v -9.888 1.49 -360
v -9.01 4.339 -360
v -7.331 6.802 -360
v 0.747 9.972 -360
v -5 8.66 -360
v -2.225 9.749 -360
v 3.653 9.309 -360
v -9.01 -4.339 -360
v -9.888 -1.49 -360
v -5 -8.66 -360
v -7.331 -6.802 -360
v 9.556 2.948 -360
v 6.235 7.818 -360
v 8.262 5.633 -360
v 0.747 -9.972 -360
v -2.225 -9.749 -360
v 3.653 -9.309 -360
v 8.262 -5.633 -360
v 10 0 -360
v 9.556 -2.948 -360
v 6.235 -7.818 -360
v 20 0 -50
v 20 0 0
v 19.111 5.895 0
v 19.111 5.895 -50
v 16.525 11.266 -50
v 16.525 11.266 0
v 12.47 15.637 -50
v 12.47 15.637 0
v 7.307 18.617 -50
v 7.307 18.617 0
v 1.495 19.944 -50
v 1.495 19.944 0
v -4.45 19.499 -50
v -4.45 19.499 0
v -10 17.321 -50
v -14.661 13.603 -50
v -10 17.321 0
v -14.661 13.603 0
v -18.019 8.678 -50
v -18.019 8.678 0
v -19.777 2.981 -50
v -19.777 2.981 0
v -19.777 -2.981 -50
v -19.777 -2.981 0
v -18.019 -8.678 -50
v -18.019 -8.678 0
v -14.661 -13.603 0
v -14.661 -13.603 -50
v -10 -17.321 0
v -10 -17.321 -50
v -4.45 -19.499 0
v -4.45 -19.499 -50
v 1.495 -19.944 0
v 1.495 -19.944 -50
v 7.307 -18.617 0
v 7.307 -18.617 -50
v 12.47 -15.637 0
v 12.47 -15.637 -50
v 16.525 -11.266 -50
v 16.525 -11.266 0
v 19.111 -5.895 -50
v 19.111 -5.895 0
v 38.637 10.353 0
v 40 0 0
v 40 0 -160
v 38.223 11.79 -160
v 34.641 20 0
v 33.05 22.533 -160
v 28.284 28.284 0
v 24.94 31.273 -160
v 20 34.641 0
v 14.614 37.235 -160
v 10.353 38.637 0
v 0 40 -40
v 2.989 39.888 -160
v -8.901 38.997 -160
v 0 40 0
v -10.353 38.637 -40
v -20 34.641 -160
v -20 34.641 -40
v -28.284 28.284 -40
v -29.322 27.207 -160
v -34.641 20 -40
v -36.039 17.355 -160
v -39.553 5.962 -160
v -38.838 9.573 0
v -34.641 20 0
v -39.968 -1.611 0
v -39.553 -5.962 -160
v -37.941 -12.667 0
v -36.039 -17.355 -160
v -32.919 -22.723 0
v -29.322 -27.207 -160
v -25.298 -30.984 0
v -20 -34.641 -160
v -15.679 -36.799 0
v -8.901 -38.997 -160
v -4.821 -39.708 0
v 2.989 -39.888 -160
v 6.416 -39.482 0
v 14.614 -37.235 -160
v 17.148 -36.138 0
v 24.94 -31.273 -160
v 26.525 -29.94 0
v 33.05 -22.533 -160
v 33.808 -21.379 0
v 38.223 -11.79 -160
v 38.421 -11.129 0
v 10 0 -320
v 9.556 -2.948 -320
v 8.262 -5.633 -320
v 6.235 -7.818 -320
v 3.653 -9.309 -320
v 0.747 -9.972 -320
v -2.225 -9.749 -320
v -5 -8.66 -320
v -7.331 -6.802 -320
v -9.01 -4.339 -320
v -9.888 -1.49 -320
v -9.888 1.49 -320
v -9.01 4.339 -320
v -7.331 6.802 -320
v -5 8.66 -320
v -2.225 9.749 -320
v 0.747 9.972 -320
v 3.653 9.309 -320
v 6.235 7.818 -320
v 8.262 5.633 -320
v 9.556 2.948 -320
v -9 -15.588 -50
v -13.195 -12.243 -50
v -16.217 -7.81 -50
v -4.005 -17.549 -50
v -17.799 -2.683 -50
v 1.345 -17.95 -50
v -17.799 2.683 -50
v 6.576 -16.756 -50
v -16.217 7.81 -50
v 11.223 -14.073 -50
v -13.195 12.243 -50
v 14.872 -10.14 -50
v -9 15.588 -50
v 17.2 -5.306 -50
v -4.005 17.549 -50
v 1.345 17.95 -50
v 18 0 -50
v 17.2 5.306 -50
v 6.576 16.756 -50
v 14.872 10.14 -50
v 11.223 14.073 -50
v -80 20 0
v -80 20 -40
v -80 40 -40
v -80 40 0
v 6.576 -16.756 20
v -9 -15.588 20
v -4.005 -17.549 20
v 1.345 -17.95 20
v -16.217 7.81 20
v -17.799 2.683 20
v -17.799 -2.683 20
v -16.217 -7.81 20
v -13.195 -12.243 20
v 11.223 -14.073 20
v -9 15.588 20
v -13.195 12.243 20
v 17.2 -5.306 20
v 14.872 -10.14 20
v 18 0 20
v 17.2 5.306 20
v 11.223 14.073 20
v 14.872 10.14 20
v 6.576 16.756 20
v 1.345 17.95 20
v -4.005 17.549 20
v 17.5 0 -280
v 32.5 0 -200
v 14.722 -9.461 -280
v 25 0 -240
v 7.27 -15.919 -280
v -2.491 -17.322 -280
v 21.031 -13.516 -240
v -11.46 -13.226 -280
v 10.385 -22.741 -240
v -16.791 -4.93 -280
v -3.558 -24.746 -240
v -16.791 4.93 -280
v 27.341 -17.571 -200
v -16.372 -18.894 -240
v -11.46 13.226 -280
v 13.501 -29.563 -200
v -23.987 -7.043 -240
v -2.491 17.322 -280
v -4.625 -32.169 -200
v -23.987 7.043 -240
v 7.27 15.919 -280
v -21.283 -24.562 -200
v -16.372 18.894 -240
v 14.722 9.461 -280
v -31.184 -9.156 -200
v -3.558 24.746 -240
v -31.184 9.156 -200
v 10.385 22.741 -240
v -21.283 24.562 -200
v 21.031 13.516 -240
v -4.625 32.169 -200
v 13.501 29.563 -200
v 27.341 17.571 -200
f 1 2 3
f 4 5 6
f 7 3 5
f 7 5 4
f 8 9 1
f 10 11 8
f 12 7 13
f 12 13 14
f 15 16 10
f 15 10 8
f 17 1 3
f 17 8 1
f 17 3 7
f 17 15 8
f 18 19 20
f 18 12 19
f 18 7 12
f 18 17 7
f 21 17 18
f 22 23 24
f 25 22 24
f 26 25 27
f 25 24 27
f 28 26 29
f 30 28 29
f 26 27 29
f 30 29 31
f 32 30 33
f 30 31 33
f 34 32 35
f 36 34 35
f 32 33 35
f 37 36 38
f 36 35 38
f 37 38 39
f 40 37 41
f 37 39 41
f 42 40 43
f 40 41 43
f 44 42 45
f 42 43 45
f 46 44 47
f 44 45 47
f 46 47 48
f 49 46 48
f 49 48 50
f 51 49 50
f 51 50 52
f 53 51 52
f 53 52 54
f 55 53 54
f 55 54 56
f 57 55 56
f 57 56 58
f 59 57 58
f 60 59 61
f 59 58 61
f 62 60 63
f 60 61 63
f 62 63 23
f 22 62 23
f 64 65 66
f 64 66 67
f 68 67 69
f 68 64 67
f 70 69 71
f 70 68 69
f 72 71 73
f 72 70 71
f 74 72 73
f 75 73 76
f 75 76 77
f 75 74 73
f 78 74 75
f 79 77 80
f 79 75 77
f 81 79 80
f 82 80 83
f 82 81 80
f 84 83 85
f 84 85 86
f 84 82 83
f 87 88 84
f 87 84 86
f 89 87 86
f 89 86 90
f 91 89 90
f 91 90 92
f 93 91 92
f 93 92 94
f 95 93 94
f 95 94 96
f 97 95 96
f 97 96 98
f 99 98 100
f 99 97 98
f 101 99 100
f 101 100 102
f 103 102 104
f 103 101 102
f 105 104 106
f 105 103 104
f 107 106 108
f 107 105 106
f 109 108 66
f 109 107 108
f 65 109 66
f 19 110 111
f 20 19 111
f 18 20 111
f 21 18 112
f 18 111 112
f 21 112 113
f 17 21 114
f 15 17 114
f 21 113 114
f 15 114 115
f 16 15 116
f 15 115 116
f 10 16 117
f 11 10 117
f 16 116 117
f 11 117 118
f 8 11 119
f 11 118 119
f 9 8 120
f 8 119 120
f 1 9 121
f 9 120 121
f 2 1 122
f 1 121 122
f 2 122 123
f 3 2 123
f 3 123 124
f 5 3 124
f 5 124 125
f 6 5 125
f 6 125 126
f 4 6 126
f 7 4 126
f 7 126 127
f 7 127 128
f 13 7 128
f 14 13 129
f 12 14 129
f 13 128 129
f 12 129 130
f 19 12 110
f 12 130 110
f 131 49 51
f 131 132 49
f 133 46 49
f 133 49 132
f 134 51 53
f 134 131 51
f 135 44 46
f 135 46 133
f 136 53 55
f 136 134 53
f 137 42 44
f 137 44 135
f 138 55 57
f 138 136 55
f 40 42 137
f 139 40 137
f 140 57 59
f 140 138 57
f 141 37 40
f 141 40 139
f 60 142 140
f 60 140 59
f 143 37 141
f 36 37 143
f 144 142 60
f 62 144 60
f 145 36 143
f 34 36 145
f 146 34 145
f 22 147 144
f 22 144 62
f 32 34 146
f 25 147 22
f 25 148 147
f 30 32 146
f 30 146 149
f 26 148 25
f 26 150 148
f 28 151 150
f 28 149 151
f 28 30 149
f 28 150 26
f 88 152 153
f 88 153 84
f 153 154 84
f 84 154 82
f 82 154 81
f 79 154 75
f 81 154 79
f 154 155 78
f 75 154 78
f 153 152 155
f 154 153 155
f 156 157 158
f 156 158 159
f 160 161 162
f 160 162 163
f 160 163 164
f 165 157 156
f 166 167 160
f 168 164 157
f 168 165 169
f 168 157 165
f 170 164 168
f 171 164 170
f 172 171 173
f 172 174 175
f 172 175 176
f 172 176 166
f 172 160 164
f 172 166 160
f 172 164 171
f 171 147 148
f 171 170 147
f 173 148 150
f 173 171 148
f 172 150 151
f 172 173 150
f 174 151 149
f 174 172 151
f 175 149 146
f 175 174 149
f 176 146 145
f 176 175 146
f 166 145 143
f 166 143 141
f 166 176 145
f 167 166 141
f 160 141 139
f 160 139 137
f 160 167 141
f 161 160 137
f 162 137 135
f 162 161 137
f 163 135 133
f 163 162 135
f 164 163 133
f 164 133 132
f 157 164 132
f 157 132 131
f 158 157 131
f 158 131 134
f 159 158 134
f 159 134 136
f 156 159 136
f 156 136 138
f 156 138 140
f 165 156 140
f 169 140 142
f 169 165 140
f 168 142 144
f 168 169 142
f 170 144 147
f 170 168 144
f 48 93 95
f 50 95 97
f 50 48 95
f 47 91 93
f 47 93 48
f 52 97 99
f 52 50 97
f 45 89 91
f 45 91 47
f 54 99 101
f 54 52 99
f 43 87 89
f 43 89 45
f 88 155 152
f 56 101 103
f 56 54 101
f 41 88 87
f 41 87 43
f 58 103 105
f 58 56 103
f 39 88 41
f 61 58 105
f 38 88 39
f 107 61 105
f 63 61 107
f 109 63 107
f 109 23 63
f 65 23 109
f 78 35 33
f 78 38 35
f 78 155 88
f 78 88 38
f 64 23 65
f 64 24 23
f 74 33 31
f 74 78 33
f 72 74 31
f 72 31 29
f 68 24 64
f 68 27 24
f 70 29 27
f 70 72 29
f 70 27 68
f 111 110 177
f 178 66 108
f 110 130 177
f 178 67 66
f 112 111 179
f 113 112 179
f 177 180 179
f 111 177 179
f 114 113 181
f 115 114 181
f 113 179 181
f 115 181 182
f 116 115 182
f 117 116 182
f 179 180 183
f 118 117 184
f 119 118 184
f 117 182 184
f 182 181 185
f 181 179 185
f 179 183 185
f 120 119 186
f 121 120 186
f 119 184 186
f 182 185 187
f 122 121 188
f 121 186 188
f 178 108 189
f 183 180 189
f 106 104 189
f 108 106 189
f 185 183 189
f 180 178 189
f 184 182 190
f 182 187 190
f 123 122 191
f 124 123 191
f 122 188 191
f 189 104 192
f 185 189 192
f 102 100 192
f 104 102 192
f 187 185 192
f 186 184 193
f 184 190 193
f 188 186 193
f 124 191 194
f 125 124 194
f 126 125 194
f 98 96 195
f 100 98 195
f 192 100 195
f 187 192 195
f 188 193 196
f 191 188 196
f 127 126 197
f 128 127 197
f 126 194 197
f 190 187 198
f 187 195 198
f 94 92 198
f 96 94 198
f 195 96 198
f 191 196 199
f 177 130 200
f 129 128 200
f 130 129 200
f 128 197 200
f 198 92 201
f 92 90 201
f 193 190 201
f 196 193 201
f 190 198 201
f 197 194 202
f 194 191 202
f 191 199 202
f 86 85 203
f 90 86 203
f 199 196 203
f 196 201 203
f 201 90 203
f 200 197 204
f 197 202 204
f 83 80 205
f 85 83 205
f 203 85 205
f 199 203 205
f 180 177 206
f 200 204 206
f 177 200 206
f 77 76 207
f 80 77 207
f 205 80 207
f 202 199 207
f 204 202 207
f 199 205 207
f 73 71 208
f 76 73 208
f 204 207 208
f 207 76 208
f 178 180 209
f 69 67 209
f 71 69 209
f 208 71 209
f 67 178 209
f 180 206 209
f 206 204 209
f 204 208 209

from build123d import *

# Parameters (mm, degrees)
F0_R      = 40
F1_DEPTH  = 160
F3_R      = 10
F1_FACE_R = 40
F5_DEPTH  = 40
F6_W      = 80
F6_H      = 20
F7_DEPTH  = 40
F8_R      = 18
F9_DEPTH  = 20
F10_R     = 20
F10_R_2   = 18
F11_DEPTH = 50


with BuildPart() as f1:
    # F0 (on Top) → F1 (new body)
    with BuildSketch(Plane.XY):
        Circle(F0_R)
    extrude(amount=-F1_DEPTH)

    # F3 (on offset) → F4 section 0
    with BuildSketch(Plane(origin=(0, 0, -320), x_dir=(1, 0, 0), z_dir=(0, 0, -1))):
        Circle(F3_R)
    # F1_face (on face) → F4 section 1
    with BuildSketch(Plane(origin=(0, 0, -160), x_dir=(1, 0, 0), z_dir=(0, 0, -1))):
        Circle(F1_FACE_R)
    loft()

    # F5 (add): a face of the model
    f5_faces = [f1.faces().sort_by_distance(p)[0] for p in [
        (0, 0, -320),
    ]]
    extrude(f5_faces, amount=F5_DEPTH)

    # F6 (on Top) → F7 (join)
    with BuildSketch(Plane.XY):
        with Locations((-40, 30)):
            Rectangle(F6_W, F6_H)
    extrude(amount=-F7_DEPTH)

    # F8 (on face) → F9 (join)
    with BuildSketch(Plane.XY):
        Circle(F8_R)
    extrude(amount=F9_DEPTH)

    # F10 (on face) → F11 (cut)
    with BuildSketch(Plane.XY):
        Circle(F10_R)
        Circle(F10_R_2, mode=Mode.SUBTRACT)
    extrude(amount=-F11_DEPTH, mode=Mode.SUBTRACT)


solid = f1.part
